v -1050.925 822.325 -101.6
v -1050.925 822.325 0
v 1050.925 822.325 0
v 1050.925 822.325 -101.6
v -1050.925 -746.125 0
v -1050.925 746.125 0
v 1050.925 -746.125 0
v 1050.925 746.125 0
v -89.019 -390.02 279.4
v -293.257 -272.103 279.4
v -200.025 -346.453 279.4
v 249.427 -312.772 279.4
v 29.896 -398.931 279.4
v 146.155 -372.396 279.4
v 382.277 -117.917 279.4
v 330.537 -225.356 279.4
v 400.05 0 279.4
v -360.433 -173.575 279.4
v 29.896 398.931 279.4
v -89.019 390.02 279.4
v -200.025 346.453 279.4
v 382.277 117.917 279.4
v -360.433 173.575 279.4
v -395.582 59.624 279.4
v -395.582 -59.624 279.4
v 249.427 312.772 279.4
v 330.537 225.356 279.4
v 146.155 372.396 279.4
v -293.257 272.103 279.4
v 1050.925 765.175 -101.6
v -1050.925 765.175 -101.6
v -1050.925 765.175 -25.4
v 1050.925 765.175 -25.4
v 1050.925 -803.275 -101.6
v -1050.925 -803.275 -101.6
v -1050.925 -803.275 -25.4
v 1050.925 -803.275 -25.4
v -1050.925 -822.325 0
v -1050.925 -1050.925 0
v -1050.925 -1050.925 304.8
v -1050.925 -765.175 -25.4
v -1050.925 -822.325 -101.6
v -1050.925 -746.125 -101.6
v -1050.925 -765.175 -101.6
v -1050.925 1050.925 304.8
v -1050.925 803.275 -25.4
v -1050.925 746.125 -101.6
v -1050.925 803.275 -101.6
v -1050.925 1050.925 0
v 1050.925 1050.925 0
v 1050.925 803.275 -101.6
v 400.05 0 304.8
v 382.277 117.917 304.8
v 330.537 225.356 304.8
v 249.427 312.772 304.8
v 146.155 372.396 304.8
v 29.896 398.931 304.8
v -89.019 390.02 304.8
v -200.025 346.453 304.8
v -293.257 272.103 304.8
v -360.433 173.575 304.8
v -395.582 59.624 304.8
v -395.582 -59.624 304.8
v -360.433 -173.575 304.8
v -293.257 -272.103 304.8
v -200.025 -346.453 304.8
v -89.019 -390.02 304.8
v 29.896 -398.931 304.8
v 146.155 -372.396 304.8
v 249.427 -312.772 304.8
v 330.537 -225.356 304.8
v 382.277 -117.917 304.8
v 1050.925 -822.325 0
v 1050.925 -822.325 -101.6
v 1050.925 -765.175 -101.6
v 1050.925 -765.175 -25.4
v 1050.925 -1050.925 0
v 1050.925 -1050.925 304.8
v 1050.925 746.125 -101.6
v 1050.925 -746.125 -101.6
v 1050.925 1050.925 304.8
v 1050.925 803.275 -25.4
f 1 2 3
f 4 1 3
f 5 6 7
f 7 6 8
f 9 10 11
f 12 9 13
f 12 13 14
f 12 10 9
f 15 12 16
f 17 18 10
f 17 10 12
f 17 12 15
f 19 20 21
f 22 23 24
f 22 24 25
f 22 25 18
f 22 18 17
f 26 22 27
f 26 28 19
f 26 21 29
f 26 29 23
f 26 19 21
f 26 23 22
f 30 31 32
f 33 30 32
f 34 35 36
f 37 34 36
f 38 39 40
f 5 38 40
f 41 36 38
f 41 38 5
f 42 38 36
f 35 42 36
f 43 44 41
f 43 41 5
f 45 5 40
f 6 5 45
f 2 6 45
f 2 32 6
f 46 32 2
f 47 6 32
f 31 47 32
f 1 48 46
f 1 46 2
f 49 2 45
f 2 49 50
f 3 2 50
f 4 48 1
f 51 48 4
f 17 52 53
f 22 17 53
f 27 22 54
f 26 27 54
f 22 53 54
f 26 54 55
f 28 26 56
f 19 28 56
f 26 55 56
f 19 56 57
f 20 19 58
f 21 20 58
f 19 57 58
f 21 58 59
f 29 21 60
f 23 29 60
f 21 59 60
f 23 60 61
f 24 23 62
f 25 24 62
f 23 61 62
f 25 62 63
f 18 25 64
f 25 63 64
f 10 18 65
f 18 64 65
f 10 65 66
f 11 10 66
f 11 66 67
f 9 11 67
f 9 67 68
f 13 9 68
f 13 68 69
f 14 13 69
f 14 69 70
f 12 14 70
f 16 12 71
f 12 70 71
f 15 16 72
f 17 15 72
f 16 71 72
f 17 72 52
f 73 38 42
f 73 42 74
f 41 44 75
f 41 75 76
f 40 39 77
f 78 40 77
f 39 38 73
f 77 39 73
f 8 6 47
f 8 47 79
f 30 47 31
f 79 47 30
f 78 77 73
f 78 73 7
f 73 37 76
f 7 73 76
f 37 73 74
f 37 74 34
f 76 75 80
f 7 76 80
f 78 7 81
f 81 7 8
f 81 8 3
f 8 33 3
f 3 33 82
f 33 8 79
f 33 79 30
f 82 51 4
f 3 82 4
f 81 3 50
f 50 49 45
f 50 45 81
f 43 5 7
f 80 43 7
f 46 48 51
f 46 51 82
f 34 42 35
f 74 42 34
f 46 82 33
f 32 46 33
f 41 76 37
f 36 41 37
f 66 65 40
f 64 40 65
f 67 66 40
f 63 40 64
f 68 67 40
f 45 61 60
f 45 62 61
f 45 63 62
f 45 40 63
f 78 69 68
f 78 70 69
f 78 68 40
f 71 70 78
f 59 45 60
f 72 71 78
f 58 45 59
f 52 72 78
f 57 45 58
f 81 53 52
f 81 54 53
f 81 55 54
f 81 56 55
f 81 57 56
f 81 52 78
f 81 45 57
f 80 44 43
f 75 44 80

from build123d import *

# Parameters (mm, degrees)
F0_W     = 2101.85
F0_H     = 2101.85
F1_DEPTH = 304.8
F2_R     = 400.05
F3_DEPTH = 25.4
F4_W     = 2101.85
F4_H     = 76.2
F5_DEPTH = 101.6
F6_W     = 38.1
F6_H     = 76.2
F7_DEPTH = 2101.851


with BuildPart() as f1:
    # F0 (on Top) → F1 (new body)
    with BuildSketch(Plane.XY):
        Rectangle(F0_W, F0_H)
    extrude(amount=F1_DEPTH)

    # F2 (on face) → F3 (cut)
    with BuildSketch(Plane.XY.offset(304.8)):
        Circle(F2_R)
    extrude(amount=-F3_DEPTH, mode=Mode.SUBTRACT)

    # F4 (on face) → F5 (join)
    with BuildSketch(Plane(origin=(0, 0, 0), x_dir=(1, 0, 0), z_dir=(0, 0, -1))):
        with Locations((0, 784.225)):
            Rectangle(F4_W, F4_H)
        with Locations((0, -784.225)):
            Rectangle(F4_W, F4_H)
    extrude(amount=F5_DEPTH)

    # F6 (on face) → F7 (cut, through all)
    with BuildSketch(Plane(origin=(-1050.925, 0, 0), x_dir=(0, -1, 0), z_dir=(-1, 0, 0))):
        with Locations((-784.225, -63.5)):
            Rectangle(F6_W, F6_H)
        with Locations((784.225, -63.5)):
            Rectangle(F6_W, F6_H)
    extrude(amount=-F7_DEPTH, mode=Mode.SUBTRACT)


solid = f1.part
